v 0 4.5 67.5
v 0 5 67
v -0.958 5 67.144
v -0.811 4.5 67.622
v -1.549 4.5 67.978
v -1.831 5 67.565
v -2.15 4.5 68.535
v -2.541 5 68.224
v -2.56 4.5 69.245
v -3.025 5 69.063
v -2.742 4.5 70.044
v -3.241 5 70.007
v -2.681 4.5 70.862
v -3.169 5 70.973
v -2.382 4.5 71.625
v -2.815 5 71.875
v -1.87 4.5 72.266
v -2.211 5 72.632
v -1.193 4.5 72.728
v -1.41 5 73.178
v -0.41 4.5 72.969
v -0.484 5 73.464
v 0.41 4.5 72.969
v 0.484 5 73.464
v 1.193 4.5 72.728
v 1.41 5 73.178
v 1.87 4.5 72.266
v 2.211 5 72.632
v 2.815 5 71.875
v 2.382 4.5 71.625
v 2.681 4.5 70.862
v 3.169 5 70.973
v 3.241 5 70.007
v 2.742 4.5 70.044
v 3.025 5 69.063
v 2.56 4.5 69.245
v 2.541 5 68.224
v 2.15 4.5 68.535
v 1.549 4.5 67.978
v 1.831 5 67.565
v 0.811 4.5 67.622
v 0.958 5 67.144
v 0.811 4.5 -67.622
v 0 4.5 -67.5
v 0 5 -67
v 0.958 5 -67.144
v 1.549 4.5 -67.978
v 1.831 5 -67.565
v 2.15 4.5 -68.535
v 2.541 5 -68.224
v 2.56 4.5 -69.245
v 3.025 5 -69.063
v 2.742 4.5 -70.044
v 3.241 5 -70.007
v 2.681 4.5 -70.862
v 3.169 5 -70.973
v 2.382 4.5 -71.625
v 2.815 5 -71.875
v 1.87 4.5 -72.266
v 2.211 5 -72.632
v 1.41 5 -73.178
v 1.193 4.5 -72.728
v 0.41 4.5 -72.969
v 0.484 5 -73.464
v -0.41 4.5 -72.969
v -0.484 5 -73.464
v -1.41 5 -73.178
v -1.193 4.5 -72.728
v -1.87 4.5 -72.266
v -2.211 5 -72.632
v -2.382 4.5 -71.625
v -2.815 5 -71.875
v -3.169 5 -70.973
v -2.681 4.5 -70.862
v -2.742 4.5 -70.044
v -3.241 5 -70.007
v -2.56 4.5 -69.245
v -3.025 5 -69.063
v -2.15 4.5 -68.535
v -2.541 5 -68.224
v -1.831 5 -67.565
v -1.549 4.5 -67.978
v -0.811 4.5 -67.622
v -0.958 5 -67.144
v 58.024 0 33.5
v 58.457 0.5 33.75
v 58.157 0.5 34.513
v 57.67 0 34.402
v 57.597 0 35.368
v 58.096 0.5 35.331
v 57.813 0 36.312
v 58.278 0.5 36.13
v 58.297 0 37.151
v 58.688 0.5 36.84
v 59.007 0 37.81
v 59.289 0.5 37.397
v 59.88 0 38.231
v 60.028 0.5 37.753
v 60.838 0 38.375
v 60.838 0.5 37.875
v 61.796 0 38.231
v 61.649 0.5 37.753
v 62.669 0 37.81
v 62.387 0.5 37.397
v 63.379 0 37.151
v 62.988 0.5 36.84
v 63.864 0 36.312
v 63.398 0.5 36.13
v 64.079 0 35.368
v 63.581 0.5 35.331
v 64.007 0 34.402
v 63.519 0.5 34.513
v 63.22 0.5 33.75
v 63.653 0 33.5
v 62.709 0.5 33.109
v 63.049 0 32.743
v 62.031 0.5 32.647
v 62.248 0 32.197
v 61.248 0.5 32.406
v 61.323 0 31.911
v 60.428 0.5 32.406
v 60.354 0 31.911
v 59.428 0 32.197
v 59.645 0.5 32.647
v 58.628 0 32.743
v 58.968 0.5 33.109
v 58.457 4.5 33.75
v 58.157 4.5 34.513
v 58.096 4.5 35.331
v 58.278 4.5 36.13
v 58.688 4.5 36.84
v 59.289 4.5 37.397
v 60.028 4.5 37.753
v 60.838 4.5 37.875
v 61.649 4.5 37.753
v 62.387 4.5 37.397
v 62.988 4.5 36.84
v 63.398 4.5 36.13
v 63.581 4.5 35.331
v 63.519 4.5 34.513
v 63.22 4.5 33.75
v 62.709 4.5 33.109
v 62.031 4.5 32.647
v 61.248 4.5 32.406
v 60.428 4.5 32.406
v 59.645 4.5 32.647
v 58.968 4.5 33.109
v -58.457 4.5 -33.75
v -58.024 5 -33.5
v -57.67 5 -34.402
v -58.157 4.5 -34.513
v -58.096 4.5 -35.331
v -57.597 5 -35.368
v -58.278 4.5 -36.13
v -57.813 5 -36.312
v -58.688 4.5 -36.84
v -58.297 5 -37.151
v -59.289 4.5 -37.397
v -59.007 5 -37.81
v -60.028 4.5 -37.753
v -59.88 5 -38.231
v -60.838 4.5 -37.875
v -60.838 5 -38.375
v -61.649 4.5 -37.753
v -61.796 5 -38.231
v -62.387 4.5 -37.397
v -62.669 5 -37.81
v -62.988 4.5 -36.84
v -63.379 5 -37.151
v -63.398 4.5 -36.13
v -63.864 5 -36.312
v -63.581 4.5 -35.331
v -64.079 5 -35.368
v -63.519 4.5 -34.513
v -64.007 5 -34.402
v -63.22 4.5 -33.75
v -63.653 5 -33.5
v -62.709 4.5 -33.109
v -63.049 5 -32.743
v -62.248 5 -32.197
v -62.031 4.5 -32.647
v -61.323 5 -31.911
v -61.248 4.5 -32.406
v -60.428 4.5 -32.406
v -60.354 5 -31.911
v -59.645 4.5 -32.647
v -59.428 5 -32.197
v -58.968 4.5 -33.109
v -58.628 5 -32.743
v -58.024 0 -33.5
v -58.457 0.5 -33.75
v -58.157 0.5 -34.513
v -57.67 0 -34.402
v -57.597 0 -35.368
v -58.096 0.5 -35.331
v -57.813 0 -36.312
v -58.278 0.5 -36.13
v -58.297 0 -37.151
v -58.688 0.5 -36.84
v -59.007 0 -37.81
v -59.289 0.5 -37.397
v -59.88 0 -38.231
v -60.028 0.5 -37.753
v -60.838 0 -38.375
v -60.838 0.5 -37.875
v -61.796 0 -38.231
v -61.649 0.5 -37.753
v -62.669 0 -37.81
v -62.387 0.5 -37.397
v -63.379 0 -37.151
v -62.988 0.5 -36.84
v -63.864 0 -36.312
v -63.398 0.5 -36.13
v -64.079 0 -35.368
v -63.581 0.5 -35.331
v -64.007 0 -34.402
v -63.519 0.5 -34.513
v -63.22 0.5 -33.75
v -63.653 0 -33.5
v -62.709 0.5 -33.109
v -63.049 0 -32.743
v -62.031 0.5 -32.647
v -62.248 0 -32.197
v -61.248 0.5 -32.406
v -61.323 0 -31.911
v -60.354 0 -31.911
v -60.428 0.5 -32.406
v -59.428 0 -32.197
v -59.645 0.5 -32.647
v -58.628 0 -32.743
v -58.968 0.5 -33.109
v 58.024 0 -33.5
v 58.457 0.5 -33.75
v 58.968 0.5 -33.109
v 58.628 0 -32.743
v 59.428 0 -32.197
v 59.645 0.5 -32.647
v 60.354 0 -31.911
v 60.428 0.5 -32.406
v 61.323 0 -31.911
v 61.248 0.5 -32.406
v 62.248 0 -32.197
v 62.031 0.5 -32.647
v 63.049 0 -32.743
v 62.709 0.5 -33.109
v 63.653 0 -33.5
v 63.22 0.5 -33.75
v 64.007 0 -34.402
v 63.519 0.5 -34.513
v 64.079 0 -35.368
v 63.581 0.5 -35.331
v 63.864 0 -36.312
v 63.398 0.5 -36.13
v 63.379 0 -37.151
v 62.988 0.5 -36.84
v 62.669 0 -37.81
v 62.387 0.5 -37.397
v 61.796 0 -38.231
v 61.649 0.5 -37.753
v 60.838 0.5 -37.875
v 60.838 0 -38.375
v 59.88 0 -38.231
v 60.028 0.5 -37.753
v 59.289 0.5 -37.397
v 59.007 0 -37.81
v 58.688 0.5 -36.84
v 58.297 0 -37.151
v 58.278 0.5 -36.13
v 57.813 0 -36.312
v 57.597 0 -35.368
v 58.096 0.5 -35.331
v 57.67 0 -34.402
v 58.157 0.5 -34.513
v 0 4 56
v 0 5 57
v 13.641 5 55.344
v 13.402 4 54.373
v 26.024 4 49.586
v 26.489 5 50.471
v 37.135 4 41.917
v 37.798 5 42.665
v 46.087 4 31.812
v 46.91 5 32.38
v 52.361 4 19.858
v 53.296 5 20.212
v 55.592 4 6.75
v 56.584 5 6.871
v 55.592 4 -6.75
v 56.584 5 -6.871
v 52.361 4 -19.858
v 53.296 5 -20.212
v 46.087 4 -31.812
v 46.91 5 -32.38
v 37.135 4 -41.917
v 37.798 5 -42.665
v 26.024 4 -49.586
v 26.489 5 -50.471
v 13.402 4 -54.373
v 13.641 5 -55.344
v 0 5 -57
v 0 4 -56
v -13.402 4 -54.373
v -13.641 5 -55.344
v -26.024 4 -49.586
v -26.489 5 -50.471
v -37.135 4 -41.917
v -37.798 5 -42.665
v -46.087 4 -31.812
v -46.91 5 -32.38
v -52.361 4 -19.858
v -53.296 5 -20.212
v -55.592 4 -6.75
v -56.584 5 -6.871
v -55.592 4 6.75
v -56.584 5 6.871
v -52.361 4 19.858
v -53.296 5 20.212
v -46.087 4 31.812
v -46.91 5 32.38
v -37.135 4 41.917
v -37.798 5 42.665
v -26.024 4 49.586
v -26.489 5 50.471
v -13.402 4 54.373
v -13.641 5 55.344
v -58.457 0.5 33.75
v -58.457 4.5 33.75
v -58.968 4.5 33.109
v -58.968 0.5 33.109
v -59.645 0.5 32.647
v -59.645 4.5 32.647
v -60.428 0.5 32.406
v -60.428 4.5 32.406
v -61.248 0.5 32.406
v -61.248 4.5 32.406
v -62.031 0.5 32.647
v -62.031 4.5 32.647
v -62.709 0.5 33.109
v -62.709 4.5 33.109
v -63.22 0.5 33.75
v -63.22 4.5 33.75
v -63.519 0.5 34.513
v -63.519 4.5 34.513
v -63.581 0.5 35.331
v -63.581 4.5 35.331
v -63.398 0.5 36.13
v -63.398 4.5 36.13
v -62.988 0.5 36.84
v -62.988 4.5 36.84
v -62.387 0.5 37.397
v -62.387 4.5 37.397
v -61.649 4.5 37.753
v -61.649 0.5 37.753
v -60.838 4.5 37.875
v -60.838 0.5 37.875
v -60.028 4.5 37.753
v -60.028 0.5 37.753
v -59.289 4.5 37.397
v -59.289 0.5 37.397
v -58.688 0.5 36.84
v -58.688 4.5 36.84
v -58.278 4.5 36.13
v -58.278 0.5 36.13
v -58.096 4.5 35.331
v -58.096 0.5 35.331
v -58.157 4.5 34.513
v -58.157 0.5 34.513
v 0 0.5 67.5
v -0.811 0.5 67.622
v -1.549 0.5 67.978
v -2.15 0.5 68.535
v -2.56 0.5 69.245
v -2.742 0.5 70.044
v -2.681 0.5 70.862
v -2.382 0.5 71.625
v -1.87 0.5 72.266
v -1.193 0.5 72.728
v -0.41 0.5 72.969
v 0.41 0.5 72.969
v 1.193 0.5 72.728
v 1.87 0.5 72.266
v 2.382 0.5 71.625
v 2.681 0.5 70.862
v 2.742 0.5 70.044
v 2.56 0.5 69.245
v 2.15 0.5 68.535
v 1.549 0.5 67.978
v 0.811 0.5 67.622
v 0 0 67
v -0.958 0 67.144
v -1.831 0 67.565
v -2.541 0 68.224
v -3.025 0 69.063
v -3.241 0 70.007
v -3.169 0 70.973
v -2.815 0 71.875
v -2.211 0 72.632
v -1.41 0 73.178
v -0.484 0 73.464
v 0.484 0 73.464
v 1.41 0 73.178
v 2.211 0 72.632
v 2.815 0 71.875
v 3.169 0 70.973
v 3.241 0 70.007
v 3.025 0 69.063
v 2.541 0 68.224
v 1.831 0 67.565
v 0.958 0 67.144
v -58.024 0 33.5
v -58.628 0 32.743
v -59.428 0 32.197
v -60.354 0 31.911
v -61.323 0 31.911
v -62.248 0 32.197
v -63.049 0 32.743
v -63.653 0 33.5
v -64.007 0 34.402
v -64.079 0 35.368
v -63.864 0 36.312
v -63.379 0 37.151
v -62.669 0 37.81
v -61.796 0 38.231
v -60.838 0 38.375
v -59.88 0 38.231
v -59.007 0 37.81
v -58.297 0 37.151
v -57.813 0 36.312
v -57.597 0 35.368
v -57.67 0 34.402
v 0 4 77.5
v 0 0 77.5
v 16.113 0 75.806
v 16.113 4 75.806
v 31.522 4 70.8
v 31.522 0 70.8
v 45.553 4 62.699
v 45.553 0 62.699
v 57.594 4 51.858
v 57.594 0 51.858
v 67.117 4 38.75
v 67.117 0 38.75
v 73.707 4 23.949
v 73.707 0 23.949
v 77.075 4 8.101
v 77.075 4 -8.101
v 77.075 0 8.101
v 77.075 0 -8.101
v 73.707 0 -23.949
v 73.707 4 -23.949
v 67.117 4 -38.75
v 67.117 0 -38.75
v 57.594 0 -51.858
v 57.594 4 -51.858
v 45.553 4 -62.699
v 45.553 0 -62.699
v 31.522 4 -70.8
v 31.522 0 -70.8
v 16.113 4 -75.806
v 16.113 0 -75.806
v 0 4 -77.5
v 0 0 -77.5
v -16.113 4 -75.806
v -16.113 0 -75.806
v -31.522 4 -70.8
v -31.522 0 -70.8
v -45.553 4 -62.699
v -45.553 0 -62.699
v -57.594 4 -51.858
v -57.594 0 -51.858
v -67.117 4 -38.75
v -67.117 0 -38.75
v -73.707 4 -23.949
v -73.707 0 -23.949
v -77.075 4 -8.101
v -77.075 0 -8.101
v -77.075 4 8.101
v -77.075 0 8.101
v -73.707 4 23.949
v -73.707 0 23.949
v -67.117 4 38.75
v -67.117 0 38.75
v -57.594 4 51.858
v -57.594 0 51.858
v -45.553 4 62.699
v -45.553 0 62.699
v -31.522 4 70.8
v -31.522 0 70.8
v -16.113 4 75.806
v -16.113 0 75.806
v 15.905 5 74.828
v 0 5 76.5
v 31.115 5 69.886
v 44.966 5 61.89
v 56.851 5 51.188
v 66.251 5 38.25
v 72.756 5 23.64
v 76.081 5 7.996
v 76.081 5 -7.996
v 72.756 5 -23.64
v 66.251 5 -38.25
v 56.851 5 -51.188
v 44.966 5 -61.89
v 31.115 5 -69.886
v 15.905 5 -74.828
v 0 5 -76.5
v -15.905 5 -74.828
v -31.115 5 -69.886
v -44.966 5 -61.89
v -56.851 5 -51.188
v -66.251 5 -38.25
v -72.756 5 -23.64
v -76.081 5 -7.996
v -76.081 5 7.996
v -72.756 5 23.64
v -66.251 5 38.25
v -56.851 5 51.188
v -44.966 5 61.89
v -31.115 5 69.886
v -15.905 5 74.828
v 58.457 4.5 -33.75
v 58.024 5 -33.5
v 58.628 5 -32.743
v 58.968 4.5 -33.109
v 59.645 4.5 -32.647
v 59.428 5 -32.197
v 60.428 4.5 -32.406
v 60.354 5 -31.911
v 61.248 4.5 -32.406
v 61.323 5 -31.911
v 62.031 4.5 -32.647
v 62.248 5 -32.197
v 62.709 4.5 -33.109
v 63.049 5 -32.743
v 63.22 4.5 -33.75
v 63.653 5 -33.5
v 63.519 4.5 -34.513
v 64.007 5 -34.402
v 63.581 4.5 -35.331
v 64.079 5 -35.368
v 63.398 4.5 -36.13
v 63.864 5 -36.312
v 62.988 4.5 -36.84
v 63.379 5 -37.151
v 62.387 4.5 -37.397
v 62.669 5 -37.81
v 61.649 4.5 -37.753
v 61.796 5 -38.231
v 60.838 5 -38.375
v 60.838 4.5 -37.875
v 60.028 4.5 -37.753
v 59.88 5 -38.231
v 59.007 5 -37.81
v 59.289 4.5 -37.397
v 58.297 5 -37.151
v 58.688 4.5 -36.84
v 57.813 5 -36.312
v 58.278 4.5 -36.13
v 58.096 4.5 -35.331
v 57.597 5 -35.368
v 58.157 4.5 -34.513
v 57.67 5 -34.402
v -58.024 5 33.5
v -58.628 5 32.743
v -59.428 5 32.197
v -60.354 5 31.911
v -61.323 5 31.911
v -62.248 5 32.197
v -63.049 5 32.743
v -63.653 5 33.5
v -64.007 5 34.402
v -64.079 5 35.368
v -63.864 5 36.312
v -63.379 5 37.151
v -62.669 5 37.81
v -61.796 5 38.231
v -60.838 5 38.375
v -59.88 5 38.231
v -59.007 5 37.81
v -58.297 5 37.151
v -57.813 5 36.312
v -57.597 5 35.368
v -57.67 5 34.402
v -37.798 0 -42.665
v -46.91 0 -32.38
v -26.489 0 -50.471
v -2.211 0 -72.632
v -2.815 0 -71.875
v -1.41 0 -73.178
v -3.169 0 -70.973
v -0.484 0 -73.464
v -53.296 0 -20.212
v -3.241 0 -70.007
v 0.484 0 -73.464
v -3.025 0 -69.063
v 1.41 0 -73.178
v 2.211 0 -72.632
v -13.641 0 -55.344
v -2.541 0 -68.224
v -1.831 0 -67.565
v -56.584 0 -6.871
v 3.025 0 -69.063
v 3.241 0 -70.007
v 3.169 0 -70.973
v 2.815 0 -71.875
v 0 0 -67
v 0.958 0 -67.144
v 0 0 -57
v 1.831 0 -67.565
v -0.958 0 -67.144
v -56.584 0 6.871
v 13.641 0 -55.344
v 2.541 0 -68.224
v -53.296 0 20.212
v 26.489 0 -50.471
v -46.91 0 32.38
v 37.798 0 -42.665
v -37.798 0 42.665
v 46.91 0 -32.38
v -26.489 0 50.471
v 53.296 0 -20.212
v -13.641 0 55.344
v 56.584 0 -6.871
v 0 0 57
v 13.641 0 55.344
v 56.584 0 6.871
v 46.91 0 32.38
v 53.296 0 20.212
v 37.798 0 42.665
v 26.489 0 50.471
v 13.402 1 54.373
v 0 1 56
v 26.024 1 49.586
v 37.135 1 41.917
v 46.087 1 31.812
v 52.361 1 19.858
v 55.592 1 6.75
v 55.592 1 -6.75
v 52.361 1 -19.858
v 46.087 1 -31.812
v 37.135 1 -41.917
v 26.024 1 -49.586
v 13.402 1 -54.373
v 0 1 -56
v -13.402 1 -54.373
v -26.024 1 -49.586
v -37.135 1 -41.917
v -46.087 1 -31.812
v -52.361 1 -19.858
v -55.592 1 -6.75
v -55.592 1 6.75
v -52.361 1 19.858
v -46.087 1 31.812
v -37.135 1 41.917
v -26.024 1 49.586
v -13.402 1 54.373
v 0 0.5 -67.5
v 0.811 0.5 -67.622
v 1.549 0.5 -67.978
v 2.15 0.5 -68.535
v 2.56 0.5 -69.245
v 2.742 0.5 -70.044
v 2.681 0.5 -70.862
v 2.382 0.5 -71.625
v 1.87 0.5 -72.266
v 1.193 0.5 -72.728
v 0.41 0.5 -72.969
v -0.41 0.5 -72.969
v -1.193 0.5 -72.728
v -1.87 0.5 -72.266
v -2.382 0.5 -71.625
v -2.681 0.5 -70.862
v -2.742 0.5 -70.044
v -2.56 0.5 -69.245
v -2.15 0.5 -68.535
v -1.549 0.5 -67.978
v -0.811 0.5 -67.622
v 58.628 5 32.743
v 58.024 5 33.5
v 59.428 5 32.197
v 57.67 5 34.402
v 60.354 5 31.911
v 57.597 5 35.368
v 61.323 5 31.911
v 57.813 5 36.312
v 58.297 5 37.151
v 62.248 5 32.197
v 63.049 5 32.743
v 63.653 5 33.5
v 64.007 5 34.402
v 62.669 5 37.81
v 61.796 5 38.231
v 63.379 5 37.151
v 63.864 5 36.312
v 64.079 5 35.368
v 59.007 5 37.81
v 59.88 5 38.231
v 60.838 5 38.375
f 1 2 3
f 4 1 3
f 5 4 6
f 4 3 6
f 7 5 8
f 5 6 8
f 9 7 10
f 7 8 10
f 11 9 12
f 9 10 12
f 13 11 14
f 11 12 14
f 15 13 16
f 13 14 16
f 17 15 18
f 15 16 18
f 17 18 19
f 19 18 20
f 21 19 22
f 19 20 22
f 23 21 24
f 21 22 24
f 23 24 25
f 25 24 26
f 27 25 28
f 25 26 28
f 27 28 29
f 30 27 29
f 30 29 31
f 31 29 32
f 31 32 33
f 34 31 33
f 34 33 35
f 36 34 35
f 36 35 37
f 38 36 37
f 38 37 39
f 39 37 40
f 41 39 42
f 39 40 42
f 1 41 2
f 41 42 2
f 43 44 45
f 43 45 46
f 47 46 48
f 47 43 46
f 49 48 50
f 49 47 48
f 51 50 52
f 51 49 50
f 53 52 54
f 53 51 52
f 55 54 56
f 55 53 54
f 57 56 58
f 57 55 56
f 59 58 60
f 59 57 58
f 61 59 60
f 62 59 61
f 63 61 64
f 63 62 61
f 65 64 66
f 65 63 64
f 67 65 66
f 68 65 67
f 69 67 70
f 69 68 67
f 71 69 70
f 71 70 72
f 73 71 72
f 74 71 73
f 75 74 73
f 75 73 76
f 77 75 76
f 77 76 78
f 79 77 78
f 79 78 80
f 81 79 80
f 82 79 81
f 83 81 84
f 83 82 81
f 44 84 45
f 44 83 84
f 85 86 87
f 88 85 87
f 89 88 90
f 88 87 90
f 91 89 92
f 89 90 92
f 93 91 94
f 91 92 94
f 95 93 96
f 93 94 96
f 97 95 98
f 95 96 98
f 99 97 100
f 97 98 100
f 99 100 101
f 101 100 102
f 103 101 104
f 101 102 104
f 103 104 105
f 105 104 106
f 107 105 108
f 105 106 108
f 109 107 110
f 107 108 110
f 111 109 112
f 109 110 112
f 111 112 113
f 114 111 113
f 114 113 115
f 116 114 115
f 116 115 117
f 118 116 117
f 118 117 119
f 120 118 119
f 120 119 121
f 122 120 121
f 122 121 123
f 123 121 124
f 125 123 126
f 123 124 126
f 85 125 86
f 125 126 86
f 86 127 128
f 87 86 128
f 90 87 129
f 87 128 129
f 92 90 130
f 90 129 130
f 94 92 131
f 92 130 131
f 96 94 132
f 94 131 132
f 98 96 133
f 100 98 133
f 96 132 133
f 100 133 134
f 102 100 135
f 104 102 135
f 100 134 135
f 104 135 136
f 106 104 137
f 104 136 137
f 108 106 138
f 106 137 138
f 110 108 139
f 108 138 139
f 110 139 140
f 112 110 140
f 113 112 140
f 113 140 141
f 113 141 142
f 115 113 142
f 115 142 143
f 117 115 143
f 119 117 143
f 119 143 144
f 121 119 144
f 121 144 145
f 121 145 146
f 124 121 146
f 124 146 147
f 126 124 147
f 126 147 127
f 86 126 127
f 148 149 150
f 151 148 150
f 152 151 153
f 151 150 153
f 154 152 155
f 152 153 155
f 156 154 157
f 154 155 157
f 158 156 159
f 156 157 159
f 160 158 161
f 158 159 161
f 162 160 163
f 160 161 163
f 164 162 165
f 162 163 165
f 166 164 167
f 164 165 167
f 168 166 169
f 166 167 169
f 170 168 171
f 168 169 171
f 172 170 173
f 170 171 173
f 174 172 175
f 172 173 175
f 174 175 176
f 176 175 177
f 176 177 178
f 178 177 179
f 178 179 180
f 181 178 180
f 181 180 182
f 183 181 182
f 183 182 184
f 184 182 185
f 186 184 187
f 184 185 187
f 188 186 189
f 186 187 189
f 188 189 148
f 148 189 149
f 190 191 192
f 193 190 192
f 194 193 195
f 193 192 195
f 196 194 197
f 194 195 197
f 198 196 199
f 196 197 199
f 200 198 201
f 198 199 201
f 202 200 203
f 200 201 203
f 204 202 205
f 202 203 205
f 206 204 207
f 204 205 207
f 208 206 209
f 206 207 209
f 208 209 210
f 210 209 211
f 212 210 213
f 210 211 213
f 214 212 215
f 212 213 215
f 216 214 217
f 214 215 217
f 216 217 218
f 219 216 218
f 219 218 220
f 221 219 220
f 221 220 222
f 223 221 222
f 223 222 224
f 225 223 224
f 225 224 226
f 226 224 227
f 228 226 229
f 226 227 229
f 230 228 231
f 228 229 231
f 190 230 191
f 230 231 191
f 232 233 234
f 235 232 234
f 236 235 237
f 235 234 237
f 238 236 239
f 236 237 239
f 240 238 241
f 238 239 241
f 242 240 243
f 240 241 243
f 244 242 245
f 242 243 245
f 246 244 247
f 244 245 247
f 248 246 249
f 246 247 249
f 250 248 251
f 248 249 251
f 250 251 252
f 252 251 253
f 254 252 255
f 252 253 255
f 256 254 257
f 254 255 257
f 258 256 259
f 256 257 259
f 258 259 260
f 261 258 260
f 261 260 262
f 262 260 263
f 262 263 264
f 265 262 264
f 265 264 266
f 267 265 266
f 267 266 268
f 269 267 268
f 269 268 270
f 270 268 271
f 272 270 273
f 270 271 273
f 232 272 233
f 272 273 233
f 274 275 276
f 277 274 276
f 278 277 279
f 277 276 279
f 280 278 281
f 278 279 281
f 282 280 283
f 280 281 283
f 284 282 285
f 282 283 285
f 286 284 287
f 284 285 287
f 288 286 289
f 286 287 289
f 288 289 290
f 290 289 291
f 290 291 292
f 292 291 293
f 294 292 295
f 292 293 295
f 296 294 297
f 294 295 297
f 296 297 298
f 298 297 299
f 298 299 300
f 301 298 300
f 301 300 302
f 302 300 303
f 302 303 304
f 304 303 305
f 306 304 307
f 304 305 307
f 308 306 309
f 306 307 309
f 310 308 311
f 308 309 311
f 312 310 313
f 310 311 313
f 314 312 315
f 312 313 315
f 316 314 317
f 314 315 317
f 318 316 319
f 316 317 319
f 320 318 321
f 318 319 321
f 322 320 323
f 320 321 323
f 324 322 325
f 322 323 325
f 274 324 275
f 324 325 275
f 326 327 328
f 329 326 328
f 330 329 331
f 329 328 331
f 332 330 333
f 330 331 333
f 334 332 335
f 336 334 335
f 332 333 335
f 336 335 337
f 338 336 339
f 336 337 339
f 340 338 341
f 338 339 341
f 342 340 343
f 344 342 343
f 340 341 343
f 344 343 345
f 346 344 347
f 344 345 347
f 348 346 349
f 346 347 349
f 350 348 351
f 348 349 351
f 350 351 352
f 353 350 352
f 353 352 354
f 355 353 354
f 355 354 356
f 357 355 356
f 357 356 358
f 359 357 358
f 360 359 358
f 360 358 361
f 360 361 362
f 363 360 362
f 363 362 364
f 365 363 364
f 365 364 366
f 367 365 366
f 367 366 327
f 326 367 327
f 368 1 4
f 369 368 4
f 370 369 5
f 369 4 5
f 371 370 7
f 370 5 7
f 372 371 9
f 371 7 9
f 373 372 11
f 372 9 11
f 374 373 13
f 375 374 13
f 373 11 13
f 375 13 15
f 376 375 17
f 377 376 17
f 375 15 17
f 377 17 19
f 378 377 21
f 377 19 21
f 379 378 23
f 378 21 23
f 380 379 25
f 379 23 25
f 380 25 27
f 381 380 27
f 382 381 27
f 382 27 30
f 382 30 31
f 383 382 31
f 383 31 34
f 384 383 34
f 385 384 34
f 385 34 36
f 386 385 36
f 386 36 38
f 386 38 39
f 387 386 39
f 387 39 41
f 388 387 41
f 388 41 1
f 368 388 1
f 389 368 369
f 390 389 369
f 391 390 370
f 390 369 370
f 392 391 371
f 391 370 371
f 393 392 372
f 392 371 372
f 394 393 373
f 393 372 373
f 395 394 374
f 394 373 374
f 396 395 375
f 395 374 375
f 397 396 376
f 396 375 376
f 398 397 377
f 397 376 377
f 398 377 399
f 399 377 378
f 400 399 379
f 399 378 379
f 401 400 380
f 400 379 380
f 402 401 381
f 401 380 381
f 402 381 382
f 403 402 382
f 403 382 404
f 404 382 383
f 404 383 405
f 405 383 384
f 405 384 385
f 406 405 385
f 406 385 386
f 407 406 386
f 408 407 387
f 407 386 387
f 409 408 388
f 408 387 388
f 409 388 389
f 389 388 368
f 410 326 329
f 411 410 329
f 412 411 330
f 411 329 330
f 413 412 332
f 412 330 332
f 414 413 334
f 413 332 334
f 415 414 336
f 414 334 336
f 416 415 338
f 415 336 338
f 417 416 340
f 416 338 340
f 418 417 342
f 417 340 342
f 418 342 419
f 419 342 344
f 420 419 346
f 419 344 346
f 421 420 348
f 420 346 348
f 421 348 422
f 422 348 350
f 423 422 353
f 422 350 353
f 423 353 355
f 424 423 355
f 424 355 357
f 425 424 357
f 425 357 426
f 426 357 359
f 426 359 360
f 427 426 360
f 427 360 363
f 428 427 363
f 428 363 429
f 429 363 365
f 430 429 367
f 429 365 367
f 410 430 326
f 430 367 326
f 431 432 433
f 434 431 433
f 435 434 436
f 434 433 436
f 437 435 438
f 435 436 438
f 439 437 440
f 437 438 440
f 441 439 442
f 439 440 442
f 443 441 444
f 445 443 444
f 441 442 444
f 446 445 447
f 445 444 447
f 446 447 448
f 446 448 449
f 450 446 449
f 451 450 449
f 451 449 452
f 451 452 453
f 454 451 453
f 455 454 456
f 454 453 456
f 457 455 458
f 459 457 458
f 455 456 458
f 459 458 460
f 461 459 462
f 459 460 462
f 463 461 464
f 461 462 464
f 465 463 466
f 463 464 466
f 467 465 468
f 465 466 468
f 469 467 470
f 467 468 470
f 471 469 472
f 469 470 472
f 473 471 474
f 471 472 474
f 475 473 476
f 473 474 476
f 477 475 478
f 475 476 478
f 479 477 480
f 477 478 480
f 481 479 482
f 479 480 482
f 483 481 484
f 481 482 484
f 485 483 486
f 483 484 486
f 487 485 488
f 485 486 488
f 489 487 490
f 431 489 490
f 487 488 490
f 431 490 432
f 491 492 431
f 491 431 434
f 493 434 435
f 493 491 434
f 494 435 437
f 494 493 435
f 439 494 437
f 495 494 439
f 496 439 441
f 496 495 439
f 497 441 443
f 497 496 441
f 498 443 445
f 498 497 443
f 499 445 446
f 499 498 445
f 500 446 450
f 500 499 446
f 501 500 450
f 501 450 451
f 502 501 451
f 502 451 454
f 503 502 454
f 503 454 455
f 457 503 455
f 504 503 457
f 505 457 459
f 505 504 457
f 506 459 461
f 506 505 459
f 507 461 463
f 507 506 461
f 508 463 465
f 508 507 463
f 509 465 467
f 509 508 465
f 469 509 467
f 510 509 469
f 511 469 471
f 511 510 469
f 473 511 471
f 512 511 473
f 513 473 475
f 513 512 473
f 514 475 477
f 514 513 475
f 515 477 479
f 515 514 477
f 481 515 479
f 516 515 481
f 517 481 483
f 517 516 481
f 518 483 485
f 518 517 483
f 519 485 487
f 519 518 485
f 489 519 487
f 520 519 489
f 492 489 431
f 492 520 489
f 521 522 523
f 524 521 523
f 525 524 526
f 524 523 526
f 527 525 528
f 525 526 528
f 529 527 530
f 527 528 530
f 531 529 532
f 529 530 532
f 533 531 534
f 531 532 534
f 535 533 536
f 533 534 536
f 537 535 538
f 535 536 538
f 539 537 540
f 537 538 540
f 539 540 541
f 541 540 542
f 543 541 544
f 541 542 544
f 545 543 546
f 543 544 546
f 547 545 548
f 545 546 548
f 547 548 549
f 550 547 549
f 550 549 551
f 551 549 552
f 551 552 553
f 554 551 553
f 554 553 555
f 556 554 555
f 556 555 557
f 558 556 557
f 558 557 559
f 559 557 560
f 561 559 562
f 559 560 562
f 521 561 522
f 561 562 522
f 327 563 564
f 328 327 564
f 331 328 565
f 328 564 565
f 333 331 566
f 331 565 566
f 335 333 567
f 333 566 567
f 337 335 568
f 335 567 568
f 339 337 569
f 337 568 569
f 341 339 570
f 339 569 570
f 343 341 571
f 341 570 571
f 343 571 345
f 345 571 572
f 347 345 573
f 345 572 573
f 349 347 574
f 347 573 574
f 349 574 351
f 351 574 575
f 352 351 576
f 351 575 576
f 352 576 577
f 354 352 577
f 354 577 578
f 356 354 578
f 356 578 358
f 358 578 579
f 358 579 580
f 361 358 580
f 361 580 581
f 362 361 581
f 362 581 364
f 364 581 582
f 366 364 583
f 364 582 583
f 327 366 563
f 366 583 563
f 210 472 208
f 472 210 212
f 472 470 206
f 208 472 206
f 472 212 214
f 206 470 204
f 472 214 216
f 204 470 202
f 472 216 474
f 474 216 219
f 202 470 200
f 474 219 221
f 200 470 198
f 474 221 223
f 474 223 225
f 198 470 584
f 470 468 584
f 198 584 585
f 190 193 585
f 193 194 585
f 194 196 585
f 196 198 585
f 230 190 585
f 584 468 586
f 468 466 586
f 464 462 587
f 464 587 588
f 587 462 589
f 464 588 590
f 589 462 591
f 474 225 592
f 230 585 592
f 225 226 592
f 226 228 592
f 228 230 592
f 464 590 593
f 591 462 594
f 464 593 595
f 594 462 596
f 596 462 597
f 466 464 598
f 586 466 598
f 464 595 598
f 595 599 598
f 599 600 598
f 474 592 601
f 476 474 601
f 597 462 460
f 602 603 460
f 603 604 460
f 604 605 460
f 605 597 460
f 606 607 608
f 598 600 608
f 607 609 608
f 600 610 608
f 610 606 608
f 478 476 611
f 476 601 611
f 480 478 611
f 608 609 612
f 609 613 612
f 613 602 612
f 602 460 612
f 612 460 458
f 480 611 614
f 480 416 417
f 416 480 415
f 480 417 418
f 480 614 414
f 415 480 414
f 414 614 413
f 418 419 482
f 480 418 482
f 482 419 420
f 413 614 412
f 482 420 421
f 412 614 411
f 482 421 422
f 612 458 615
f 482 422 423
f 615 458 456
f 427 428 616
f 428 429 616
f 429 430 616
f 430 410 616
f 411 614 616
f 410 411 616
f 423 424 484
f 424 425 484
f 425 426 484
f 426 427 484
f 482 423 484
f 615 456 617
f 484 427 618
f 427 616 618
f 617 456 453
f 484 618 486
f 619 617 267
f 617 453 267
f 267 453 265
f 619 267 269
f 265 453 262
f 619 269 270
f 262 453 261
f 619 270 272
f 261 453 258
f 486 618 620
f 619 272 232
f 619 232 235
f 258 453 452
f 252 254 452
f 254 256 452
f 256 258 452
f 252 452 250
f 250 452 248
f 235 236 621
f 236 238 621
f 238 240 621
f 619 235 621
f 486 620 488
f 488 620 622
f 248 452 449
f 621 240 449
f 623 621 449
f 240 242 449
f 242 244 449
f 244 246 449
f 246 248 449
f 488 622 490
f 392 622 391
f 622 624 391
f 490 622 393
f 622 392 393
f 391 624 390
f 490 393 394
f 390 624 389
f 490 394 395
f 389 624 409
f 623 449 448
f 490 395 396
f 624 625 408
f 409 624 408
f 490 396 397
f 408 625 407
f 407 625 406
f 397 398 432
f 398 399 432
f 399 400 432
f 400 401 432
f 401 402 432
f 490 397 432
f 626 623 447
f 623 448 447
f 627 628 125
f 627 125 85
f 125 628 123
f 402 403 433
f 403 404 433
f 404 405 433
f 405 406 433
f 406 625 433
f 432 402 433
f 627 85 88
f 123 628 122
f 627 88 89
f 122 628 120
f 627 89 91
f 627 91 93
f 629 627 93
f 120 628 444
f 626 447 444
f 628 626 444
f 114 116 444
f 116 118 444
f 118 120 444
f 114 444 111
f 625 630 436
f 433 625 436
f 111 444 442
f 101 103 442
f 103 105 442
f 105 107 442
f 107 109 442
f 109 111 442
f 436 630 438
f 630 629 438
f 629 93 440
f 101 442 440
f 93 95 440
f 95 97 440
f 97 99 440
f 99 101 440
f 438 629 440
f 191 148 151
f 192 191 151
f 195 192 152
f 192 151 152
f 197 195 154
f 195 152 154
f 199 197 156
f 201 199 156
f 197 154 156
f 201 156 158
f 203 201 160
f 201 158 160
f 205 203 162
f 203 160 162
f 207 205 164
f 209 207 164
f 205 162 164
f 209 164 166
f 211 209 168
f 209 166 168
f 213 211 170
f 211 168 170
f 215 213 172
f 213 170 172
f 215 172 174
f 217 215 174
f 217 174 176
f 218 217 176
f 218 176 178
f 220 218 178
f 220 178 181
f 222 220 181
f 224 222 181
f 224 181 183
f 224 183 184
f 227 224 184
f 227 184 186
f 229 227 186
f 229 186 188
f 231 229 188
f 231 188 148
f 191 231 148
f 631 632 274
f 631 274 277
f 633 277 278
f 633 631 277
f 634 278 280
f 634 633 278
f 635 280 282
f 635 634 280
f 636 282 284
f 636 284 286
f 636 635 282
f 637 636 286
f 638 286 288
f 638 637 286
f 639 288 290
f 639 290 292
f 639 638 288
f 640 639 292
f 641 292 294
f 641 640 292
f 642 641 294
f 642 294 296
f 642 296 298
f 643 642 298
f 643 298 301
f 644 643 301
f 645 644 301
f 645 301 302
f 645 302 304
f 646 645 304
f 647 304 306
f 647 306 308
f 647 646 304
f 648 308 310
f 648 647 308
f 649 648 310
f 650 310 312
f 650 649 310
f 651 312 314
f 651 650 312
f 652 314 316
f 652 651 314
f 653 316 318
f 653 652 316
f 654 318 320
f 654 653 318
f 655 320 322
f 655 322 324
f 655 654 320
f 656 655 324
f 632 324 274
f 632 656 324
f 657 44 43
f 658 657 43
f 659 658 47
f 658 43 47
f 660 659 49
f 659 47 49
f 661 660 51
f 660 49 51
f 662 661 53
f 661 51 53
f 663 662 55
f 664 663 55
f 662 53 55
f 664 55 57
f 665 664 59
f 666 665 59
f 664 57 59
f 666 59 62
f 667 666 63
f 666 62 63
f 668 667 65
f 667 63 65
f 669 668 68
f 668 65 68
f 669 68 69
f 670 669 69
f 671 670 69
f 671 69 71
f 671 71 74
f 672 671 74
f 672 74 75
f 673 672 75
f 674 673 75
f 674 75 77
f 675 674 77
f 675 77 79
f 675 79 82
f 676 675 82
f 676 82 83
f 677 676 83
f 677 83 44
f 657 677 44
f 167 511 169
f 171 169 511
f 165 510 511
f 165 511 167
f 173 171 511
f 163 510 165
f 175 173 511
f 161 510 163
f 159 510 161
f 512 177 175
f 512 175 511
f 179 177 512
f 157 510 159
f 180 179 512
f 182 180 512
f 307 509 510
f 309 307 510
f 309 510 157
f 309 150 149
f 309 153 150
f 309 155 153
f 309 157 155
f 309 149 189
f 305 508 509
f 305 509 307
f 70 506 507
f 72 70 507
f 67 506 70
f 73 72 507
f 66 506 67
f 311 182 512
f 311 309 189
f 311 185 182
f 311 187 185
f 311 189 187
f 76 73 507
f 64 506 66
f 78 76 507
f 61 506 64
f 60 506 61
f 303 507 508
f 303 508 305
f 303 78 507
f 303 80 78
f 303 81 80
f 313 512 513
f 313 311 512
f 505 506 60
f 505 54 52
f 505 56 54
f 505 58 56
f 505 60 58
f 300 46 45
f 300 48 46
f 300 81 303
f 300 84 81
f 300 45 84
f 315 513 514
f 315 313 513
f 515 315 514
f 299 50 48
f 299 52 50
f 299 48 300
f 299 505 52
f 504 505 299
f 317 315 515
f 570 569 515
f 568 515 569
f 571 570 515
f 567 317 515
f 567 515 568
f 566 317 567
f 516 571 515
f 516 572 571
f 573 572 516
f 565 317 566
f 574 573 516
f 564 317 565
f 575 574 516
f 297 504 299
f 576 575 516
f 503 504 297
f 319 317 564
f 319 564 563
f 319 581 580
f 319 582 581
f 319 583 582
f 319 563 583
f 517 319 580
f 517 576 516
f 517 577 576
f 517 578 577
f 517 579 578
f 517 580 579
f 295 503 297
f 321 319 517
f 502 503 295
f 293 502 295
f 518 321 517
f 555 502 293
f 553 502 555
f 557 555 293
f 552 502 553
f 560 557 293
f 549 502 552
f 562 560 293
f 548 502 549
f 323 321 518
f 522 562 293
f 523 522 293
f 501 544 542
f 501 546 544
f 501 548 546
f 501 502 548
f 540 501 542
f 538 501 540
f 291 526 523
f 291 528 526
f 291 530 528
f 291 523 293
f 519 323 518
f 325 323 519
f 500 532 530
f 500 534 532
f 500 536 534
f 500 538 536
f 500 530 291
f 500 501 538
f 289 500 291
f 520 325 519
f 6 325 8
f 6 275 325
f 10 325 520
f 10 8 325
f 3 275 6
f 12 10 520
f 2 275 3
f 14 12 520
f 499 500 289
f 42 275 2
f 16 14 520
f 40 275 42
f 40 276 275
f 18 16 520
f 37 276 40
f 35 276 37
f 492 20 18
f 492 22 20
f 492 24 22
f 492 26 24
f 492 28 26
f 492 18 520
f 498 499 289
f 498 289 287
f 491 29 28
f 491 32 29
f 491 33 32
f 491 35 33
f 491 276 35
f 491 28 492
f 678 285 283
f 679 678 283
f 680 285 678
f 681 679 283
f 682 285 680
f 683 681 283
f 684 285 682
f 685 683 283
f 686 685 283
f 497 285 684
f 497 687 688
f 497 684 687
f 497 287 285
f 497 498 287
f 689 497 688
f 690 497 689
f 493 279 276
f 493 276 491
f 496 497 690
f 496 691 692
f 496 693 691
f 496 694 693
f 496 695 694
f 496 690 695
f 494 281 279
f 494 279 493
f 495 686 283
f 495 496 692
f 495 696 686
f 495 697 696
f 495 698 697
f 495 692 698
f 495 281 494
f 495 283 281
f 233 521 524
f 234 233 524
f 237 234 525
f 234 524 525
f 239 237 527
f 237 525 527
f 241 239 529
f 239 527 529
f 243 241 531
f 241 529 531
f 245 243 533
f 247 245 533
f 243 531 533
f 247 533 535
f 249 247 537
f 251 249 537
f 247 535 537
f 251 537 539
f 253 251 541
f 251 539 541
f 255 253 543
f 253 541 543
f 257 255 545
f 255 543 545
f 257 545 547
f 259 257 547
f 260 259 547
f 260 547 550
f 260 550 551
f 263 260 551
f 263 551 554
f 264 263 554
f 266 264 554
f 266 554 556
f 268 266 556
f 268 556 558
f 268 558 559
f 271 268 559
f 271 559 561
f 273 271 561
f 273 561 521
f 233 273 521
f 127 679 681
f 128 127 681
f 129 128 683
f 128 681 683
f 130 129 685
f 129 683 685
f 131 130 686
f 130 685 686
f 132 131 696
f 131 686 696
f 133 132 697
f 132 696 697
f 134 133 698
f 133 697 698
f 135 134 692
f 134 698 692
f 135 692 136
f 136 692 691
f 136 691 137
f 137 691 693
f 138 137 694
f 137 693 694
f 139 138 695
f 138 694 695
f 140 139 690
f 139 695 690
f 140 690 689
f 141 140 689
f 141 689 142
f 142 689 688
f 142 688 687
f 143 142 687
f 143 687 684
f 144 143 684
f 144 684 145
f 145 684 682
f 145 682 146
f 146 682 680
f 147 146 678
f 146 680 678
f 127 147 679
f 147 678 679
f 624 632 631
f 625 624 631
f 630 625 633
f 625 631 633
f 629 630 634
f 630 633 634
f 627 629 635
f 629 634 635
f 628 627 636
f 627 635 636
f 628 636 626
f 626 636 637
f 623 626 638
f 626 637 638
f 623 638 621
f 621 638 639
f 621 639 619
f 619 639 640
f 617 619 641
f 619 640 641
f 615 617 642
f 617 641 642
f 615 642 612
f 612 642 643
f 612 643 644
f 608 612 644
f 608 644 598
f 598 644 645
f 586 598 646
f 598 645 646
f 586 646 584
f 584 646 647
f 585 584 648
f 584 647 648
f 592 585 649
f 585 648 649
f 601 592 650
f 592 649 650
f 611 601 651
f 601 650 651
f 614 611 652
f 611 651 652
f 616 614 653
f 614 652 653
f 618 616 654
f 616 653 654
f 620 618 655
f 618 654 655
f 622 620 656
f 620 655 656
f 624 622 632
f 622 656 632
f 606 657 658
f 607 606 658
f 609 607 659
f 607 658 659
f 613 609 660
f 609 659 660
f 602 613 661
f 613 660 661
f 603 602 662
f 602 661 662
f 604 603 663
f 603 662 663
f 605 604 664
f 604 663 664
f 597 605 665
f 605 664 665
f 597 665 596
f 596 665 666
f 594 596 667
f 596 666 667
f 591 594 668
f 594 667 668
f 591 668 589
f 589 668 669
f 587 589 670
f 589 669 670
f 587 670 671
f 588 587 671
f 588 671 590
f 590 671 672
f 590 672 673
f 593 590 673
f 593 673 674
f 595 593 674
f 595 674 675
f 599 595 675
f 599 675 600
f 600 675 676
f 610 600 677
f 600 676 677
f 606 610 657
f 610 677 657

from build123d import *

# Parameters (mm, degrees)
SKETCH1_R                    = 77.5
SKETCH1_R_2                  = 56
BOSS_EXTRUDE1_DEPTH          = 5
SKETCH2_R                    = 2.75
CUT_EXTRUDE2_DEPTH           = 110.715541287
CHAMFER1_SIZE                = 0.5
CIRPATTERN1_COUNT            = 6
CHAMFER1_OF_CIRPATTERN1_SIZE = 0.5
CHAMFER2_SIZE                = 1


with BuildPart() as part:
    # Sketch1 → Boss-Extrude1 (new body)
    with BuildSketch(Plane(origin=(0, 0, 0), x_dir=(1, 0, 0), z_dir=(0, 1, 0))):
        with Locations(Location((0, 0, 0), (0, 0, 270))):
            Circle(SKETCH1_R)
        with Locations(Location((0, 0, 0), (0, 0, 270))):
            Circle(SKETCH1_R_2, mode=Mode.SUBTRACT)
    extrude(amount=BOSS_EXTRUDE1_DEPTH)

    # Sketch2 → Cut-Extrude2 (cut, through all)
    with BuildSketch(Plane(origin=(0, 5, 0), x_dir=(1, 0, 0), z_dir=(0, 1, 0))):
        with Locations(Location((0, 70.25, 0), (0, 0, 270))):
            Circle(SKETCH2_R)
    cut_extrude2 = extrude(amount=-CUT_EXTRUDE2_DEPTH, mode=Mode.SUBTRACT)

    # Chamfer1
    chamfer1_edges = [part.edges().sort_by_distance(p)[0] for p in [
        (0, 0, -73),
        (0, 5, -73),
    ]]
    chamfer(chamfer1_edges, length=CHAMFER1_SIZE)

    # CirPattern1: Cut-Extrude2 ×6 about axis
    cirpattern1_axis = Axis((0, 0, 0), (0, 1, 0))
    for i in range(1, CIRPATTERN1_COUNT):
        add(cut_extrude2.rotate(cirpattern1_axis, i * 360 / CIRPATTERN1_COUNT), mode=Mode.SUBTRACT)

    # Chamfer1 of CirPattern1
    chamfer1_of_cirpattern1_edges = [part.edges().sort_by_distance(p)[0] for p in [
        (-63.219854476, 0, -36.5),
        (-63.219854476, 5, -36.5),
        (-63.219854476, 0, 36.5),
        (-63.219854476, 5, 36.5),
        (0, 0, 73),
        (0, 5, 73),
        (63.219854476, 0, 36.5),
        (63.219854476, 5, 36.5),
        (63.219854476, 0, -36.5),
        (63.219854476, 5, -36.5),
    ]]
    chamfer(chamfer1_of_cirpattern1_edges, length=CHAMFER1_OF_CIRPATTERN1_SIZE)

    # Chamfer2
    chamfer2_edges = [part.edges().sort_by_distance(p)[0] for p in [
        (0, 5, -77.5),
        (0, 0, -56),
        (0, 5, -56),
    ]]
    chamfer(chamfer2_edges, length=CHAMFER2_SIZE)


solid = part.part
